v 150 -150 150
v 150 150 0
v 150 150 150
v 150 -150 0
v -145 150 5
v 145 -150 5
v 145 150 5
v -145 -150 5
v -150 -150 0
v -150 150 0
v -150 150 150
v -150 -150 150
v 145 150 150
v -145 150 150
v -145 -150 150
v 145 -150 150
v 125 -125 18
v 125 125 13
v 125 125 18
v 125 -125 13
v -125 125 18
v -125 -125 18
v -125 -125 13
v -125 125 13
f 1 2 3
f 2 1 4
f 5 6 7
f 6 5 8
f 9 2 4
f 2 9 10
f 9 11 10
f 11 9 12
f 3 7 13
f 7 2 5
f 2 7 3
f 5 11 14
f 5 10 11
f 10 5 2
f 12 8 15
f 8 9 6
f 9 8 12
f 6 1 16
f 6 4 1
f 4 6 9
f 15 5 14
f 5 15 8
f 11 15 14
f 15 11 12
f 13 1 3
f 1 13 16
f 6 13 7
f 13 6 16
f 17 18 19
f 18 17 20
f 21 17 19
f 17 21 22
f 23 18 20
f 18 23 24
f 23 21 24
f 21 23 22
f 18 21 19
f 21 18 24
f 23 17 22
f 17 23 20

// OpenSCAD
cm = 10;
height = 30*cm;
width  = 30*cm;
depth  = 30*cm;

module bottom(thickness) {
    // bottom
    translate([0,0,thickness / 2])
        cube([width,depth, thickness], center=true);
    // left side
    translate([-(width-thickness) / 2, 0, height / 4])
        cube([thickness, depth, height / 2], center = true);
    // right side
    translate([(width-thickness) / 2, 0, height / 4])
        cube([thickness, depth, height / 2], center = true);
}

module motherboard_tray(width, depth, thickness) {
    translate([0,0,thickness / 2])
        cube([width, depth, thickness], center = true);

}

bottom_thickness = 5;
translate([0,0,0])
    bottom(bottom_thickness);
motherboard_bottom_height = 8;
translate([0,0,bottom_thickness + motherboard_bottom_height])
    motherboard_tray(25*cm, 25*cm, 5);
